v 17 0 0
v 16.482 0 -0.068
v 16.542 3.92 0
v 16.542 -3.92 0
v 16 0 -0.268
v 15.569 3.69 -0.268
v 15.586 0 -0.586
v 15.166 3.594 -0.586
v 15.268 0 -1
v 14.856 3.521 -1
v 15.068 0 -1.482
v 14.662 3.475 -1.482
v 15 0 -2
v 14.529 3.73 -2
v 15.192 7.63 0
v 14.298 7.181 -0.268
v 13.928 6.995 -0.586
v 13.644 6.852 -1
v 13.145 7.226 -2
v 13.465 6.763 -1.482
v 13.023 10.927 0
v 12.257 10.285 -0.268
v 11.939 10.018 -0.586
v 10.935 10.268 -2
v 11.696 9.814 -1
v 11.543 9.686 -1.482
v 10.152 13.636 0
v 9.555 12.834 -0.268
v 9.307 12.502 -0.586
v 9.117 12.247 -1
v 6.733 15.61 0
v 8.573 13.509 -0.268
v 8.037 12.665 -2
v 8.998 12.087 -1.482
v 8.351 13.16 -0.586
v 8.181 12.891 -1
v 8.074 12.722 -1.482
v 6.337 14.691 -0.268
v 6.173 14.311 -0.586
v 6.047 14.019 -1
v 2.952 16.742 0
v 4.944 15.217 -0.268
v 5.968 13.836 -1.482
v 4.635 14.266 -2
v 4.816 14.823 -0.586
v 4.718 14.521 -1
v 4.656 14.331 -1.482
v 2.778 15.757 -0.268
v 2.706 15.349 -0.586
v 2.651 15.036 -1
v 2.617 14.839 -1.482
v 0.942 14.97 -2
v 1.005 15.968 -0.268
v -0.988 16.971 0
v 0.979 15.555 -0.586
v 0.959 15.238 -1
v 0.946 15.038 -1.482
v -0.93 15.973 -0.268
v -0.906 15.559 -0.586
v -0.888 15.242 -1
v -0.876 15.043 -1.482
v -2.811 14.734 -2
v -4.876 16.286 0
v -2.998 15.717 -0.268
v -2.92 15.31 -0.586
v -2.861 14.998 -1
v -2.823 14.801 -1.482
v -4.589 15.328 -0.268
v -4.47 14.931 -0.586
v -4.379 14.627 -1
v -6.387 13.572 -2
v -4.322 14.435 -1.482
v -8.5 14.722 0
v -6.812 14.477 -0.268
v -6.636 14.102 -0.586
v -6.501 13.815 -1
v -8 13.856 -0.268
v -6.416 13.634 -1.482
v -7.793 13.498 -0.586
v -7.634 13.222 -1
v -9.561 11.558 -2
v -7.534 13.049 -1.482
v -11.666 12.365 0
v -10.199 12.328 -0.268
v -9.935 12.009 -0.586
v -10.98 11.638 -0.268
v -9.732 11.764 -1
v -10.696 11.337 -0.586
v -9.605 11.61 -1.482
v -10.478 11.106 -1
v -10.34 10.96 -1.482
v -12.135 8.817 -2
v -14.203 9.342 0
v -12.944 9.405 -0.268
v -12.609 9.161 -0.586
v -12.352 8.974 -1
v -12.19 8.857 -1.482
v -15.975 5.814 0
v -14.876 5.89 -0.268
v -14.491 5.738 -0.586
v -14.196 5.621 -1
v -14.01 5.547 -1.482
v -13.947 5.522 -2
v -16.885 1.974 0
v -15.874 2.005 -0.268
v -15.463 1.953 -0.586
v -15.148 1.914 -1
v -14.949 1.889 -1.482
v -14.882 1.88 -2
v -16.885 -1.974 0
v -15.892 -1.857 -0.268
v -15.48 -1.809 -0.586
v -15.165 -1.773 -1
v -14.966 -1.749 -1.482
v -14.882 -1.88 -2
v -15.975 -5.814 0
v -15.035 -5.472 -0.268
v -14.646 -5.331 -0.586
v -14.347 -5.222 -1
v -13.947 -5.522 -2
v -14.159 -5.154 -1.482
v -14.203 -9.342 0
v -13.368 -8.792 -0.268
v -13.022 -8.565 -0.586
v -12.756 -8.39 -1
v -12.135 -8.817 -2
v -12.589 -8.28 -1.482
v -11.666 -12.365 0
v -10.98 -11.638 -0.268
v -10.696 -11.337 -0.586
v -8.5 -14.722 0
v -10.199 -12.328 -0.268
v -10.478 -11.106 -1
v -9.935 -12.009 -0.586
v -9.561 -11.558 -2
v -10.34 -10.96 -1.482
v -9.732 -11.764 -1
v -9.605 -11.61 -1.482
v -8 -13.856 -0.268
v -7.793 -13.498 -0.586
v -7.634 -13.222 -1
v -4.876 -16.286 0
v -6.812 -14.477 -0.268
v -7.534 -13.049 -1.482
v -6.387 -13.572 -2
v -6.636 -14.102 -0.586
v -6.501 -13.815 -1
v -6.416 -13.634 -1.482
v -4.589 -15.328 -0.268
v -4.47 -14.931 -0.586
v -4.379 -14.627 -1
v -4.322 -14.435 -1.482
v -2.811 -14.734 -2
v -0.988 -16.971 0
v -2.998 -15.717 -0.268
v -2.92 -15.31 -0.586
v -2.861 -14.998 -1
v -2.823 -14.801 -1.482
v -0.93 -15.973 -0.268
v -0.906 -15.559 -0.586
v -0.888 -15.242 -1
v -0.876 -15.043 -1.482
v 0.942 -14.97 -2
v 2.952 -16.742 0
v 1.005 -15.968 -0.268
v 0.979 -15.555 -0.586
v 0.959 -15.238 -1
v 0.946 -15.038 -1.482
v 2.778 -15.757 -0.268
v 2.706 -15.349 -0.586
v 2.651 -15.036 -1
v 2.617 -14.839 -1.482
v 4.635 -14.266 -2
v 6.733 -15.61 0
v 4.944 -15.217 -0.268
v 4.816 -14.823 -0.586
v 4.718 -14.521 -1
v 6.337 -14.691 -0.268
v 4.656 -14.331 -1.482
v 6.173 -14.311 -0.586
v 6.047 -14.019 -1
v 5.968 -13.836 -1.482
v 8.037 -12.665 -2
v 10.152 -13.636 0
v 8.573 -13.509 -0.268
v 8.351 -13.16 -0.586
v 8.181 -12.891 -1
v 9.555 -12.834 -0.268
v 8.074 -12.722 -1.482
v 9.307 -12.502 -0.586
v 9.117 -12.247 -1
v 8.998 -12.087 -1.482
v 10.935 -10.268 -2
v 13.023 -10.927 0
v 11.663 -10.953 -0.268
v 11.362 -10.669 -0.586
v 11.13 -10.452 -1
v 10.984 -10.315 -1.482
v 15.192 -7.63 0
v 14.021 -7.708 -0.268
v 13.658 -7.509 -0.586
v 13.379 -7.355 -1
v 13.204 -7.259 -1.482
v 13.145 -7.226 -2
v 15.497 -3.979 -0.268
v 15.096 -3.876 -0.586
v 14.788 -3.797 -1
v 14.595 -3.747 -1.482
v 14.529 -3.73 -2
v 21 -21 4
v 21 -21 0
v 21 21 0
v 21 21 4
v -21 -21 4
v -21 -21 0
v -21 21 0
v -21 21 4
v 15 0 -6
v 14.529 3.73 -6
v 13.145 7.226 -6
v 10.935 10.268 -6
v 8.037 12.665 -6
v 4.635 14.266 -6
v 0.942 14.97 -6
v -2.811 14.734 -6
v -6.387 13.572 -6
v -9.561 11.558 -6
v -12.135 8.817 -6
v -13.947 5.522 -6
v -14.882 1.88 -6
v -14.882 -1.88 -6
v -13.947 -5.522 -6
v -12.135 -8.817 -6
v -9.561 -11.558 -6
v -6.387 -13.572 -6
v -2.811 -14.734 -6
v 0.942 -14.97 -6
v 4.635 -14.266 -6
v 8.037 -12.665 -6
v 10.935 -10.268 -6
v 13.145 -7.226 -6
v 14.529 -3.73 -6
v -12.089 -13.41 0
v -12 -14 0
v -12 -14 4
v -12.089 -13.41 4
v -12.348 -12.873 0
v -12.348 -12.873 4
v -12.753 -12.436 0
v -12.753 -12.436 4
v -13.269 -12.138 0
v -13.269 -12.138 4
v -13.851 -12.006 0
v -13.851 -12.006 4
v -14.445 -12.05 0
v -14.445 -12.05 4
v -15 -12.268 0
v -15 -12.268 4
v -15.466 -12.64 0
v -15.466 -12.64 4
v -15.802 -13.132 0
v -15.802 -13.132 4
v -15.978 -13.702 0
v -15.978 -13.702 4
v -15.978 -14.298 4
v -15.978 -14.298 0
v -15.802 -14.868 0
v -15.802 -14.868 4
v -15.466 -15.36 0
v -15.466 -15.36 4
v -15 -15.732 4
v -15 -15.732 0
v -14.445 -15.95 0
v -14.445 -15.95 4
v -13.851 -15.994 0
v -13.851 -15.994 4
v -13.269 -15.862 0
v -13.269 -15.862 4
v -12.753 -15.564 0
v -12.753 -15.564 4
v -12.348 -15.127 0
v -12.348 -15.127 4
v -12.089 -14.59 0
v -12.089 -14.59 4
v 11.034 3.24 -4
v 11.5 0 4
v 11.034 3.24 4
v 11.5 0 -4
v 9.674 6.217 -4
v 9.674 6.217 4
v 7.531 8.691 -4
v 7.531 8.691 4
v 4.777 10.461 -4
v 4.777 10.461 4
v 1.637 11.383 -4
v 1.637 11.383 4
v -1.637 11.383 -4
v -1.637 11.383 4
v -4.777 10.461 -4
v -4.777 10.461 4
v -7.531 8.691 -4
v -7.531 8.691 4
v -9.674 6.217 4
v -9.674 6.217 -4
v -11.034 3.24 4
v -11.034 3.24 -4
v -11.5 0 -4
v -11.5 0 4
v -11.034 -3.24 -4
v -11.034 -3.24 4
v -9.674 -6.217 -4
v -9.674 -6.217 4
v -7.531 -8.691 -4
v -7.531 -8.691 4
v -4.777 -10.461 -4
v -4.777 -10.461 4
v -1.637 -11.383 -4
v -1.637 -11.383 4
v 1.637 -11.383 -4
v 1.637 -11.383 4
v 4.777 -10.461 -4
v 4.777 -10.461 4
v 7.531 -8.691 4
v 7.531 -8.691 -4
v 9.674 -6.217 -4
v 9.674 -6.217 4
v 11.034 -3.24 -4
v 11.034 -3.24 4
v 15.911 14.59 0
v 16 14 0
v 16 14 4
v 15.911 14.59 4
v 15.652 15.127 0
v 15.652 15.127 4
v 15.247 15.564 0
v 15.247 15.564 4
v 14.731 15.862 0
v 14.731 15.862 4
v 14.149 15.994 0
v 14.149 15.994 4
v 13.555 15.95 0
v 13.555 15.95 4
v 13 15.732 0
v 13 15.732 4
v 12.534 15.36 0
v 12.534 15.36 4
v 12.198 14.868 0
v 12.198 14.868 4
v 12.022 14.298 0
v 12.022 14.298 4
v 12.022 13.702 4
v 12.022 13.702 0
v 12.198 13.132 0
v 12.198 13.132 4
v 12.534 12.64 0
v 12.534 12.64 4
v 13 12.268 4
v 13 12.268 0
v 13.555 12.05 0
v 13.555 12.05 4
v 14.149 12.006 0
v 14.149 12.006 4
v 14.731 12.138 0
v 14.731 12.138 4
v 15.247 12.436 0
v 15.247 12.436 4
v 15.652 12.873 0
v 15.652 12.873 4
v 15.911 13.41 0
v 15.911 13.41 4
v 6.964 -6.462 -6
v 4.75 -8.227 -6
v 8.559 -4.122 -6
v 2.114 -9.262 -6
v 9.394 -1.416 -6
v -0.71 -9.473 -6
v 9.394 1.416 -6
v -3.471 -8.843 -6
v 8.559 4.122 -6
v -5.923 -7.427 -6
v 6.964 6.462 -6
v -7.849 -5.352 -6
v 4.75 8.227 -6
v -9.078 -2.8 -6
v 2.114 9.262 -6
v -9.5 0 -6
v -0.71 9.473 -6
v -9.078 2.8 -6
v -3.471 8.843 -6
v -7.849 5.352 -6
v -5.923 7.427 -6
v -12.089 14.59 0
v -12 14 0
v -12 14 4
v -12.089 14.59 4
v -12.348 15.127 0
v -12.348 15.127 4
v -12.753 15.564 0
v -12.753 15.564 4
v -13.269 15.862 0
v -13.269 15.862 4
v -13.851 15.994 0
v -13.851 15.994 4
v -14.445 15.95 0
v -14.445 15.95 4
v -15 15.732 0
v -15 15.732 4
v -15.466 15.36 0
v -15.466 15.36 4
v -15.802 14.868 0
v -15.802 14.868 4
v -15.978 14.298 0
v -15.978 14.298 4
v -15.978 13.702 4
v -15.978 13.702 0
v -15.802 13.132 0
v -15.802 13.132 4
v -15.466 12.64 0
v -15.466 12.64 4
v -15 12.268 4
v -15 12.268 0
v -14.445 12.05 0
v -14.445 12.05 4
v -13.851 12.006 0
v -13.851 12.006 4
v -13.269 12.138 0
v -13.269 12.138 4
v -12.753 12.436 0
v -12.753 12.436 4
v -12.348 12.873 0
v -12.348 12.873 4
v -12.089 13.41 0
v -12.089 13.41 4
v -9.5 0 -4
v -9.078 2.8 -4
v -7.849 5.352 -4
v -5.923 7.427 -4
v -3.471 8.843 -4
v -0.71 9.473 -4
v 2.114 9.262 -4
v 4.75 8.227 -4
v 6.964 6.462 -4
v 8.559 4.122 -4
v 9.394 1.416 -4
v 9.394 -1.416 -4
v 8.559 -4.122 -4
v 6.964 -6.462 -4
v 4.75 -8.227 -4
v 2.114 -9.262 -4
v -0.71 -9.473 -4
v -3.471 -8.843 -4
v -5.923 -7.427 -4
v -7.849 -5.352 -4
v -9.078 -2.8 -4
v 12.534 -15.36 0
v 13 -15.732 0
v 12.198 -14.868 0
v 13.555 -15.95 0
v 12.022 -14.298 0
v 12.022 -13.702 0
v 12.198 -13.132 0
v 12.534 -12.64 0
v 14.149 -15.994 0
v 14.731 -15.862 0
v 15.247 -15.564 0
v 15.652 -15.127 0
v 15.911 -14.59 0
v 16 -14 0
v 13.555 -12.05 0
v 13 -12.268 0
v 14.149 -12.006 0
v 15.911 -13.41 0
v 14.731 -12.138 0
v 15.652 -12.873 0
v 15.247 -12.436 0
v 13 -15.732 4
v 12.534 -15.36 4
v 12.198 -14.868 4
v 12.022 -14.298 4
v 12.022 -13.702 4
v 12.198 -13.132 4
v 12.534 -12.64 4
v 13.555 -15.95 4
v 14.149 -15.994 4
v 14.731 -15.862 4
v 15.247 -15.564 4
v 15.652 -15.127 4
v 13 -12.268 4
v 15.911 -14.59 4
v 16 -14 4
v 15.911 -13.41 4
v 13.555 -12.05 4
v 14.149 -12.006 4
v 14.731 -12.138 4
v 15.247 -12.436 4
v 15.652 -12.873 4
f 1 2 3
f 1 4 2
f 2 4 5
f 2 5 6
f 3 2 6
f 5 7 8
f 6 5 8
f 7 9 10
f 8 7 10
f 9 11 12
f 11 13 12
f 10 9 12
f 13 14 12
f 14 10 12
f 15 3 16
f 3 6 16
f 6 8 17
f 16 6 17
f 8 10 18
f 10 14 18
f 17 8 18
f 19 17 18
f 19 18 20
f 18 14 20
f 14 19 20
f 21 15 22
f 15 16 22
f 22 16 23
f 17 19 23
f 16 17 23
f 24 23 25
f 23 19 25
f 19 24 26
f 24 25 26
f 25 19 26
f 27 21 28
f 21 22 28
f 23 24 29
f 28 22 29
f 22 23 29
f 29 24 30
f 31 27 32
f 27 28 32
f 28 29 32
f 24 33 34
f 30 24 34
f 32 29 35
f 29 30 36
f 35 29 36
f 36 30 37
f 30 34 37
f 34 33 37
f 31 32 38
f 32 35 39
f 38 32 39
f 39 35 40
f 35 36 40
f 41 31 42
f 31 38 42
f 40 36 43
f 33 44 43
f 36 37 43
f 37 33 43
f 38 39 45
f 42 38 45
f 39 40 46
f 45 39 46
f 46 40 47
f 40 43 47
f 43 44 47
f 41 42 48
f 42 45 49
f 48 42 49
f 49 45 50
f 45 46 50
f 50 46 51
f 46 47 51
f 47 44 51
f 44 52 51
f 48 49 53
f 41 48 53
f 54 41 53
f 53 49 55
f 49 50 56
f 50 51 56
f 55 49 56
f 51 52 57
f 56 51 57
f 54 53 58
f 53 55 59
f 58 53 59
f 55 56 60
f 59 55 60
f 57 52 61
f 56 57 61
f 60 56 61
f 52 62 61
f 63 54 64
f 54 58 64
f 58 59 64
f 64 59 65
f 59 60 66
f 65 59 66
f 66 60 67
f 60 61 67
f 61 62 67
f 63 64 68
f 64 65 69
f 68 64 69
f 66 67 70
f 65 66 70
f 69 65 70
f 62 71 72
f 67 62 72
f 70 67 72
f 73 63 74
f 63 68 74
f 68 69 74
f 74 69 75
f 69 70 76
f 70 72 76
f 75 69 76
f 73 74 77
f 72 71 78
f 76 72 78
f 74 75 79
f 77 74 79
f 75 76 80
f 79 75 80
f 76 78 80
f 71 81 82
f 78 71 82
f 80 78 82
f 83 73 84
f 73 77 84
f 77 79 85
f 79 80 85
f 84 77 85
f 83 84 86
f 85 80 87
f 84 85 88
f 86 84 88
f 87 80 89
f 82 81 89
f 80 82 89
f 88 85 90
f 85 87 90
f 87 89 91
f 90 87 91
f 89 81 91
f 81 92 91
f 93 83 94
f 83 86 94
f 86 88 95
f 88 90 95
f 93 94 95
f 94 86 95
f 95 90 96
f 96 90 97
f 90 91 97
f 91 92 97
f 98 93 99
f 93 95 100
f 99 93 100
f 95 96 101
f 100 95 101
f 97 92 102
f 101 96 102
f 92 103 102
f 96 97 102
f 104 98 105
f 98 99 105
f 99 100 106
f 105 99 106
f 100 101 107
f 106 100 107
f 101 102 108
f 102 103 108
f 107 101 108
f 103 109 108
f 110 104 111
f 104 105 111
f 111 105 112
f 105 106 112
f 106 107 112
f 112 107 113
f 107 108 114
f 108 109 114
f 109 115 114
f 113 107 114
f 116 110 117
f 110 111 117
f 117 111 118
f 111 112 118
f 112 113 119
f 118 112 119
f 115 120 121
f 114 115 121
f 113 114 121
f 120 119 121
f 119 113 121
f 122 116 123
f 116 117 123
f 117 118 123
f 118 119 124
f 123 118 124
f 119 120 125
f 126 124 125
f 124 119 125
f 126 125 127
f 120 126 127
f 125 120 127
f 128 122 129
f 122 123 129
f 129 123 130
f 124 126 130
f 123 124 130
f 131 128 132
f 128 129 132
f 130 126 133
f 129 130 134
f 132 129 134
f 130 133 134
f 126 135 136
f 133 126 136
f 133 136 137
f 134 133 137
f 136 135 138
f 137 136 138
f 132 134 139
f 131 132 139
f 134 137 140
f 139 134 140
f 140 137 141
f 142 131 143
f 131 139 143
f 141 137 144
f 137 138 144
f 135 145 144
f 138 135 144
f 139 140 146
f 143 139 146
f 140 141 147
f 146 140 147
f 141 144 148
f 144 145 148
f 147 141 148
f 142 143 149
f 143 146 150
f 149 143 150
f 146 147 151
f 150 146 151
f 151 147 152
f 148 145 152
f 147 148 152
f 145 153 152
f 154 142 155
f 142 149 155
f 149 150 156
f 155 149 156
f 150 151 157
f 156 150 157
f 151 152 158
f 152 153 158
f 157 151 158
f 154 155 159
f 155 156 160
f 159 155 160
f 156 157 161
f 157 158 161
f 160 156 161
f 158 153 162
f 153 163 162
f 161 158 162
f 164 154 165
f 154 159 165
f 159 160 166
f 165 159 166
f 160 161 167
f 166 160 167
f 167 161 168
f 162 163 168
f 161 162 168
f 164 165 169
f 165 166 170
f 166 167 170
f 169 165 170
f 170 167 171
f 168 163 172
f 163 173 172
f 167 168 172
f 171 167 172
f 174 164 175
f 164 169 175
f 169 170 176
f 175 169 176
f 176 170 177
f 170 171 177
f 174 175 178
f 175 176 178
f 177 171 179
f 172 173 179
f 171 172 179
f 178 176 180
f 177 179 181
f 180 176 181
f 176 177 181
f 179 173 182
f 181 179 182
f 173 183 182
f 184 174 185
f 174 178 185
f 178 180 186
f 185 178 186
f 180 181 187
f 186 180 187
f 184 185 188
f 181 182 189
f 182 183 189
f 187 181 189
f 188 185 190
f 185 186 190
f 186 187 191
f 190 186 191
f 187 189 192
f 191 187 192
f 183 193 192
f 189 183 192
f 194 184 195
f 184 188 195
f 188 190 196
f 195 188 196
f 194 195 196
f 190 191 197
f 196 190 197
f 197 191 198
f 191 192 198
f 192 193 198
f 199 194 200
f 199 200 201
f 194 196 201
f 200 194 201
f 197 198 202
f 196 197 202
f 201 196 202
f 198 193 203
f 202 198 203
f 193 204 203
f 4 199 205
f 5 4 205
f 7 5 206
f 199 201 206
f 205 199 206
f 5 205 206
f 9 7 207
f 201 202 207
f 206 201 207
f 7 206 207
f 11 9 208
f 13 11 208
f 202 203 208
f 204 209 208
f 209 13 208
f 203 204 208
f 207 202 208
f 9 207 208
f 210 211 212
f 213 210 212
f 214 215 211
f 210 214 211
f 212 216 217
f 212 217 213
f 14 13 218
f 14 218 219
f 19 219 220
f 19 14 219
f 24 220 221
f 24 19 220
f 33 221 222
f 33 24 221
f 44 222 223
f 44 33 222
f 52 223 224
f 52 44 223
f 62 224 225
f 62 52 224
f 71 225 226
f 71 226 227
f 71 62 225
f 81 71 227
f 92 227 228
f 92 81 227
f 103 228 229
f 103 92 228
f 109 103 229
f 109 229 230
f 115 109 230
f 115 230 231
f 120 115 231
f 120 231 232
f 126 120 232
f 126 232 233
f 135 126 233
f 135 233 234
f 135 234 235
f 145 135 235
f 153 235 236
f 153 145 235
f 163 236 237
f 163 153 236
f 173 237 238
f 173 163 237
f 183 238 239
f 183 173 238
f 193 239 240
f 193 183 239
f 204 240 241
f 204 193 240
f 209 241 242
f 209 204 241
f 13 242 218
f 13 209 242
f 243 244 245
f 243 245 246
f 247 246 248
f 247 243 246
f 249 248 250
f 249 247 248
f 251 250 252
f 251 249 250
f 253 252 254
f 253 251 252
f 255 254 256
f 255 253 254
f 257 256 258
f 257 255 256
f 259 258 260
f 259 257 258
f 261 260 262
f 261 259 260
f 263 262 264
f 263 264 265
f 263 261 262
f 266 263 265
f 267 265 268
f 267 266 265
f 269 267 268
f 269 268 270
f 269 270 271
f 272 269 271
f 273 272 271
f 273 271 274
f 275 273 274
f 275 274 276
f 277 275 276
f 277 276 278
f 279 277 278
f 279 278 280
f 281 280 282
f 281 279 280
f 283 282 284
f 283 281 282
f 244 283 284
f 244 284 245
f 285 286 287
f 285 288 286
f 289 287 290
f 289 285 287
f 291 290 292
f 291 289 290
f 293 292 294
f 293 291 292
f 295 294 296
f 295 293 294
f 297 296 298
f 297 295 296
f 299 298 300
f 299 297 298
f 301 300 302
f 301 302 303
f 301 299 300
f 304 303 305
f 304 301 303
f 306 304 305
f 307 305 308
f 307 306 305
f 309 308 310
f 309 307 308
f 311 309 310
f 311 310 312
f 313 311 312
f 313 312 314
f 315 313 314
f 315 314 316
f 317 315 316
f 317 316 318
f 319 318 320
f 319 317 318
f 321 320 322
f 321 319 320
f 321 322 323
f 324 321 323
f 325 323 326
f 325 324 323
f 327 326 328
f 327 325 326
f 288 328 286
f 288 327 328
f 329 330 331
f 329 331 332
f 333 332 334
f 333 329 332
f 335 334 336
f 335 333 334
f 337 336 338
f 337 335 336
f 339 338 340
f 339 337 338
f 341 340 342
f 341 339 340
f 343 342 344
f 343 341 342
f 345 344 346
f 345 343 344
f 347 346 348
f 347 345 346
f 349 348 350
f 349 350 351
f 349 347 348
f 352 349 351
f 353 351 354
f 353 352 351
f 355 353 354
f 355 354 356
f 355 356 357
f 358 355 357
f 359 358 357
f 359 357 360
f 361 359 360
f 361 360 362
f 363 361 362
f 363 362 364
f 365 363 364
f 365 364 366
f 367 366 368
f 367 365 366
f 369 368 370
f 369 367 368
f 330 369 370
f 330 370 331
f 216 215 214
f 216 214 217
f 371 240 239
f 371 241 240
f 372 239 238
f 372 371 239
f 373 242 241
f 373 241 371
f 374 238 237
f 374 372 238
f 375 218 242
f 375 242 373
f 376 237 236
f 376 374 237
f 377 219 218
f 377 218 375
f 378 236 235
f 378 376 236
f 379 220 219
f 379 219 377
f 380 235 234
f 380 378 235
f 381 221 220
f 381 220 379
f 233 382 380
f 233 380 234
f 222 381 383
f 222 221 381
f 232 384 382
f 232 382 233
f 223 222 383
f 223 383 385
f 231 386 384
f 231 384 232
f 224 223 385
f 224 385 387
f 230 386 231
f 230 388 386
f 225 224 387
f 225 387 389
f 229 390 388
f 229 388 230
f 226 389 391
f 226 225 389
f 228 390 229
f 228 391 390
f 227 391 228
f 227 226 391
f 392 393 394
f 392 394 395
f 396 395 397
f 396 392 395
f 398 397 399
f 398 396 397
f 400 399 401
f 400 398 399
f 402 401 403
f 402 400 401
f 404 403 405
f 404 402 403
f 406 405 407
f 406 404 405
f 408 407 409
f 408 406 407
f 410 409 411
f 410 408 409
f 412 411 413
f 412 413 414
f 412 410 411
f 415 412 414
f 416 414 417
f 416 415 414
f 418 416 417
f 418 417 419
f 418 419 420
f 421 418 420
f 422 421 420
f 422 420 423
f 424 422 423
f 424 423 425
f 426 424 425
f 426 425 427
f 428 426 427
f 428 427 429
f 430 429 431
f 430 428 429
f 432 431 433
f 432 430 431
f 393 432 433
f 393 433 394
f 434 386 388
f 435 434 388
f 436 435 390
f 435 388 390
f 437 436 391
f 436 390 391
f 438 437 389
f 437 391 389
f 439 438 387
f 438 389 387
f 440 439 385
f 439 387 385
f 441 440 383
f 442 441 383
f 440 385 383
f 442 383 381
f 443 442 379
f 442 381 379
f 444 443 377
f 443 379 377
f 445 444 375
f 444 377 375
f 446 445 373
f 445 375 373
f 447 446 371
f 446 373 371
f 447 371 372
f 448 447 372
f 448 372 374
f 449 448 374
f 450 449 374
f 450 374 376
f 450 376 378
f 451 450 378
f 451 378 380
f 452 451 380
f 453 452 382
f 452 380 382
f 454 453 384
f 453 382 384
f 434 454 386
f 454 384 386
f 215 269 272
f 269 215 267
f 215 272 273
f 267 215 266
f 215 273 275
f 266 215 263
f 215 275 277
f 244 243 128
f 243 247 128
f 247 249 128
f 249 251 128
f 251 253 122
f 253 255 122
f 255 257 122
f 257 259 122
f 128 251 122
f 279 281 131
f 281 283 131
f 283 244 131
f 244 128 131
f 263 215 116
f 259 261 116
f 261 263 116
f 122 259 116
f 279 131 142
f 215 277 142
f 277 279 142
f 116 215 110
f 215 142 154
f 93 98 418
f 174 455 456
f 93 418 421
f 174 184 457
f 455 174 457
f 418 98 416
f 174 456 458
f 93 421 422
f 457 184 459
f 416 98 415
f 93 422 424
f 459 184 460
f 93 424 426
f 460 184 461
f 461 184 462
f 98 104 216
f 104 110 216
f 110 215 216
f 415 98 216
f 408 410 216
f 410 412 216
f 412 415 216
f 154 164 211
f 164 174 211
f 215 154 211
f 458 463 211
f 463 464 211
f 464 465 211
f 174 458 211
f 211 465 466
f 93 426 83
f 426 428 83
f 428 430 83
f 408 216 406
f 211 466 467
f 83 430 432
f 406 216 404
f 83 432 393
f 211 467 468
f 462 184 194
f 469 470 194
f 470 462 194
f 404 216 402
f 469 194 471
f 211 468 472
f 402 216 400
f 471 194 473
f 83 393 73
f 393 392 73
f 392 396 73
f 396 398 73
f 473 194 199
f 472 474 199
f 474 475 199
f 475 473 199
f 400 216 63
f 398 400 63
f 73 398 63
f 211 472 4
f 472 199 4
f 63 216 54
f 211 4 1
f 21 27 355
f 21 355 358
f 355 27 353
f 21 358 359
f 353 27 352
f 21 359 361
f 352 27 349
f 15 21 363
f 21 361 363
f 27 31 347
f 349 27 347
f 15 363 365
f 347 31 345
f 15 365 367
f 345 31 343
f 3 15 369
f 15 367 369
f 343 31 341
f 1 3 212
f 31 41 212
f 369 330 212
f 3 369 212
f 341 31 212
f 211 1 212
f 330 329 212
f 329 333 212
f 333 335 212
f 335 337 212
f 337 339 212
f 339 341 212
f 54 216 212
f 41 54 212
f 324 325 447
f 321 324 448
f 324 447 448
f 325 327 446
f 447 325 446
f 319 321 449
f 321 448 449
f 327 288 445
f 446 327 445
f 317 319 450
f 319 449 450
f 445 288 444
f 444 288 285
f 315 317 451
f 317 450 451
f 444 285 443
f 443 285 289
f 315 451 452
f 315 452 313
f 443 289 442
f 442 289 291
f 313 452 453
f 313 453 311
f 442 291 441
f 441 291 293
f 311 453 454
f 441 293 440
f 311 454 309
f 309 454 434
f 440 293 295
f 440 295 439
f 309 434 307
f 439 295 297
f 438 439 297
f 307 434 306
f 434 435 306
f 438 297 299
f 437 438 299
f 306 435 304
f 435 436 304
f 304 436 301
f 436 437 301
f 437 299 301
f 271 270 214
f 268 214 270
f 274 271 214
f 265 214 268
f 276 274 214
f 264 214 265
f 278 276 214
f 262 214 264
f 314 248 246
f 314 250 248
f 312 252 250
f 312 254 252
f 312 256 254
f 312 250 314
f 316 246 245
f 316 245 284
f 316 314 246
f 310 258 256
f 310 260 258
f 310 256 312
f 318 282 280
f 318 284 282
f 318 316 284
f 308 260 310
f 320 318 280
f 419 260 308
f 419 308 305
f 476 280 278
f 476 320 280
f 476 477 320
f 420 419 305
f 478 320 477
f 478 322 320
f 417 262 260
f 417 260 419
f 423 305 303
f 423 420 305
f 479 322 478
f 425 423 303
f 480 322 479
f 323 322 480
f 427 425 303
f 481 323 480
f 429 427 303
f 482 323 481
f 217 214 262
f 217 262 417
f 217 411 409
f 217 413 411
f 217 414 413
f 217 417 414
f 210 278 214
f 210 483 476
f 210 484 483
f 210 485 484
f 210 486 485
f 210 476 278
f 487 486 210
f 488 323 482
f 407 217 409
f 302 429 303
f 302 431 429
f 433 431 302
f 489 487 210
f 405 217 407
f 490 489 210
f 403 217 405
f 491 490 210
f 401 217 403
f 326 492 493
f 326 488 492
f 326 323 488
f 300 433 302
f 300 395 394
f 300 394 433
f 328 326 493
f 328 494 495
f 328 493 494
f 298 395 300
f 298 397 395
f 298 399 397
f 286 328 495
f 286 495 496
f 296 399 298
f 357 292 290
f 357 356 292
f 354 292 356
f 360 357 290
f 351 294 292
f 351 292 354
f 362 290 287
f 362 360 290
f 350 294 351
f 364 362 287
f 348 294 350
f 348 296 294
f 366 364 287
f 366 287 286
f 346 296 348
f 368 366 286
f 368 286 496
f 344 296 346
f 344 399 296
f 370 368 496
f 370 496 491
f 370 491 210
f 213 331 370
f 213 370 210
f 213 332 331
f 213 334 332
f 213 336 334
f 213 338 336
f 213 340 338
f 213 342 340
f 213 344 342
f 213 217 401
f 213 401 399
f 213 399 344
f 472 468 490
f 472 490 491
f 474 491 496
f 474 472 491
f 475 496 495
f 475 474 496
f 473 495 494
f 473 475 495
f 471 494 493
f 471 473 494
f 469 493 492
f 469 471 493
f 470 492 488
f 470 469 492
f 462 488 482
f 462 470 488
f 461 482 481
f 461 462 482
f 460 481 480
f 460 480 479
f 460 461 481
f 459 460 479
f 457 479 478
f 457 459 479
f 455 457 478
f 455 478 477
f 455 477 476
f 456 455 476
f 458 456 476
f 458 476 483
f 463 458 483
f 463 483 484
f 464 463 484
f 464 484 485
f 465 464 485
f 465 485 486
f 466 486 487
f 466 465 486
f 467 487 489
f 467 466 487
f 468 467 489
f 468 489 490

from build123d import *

# Parameters (mm, degrees)
SKETCH1_W           = 42
SKETCH1_H           = 42
SKETCH1_R           = 2
SKETCH1_R_2         = 11.5
BOSS_EXTRUDE1_DEPTH = 4
SKETCH2_R           = 15
SKETCH2_R_2         = 11.5
BOSS_EXTRUDE2_DEPTH = 6
SKETCH3_R           = 11.5
SKETCH3_R_2         = 9.5
BOSS_EXTRUDE3_DEPTH = 2
FILLET1_R           = 2


with BuildPart() as part:
    # Sketch1 → Boss-Extrude1 (new body)
    with BuildSketch(Plane.XY):
        Rectangle(SKETCH1_W, SKETCH1_H)
        with Locations((-14, -14)):
            Circle(SKETCH1_R, mode=Mode.SUBTRACT)
        with Locations((14, 14)):
            Circle(SKETCH1_R, mode=Mode.SUBTRACT)
        with Locations((14, -14)):
            Circle(SKETCH1_R, mode=Mode.SUBTRACT)
        with Locations((-14, 14)):
            Circle(SKETCH1_R, mode=Mode.SUBTRACT)
        Circle(SKETCH1_R_2, mode=Mode.SUBTRACT)
    extrude(amount=BOSS_EXTRUDE1_DEPTH)

    # Sketch2 → Boss-Extrude2 (add)
    with BuildSketch(Plane.XY):
        Circle(SKETCH2_R)
        Circle(SKETCH2_R_2, mode=Mode.SUBTRACT)
    extrude(amount=-BOSS_EXTRUDE2_DEPTH)

    # Sketch3 → Boss-Extrude3 (add)
    with BuildSketch(Plane(origin=(0, 0, -6), x_dir=(-1, 0, 0), z_dir=(0, 0, -1))):
        Circle(SKETCH3_R)
        Circle(SKETCH3_R_2, mode=Mode.SUBTRACT)
    extrude(amount=-BOSS_EXTRUDE3_DEPTH)

    # Fillet1
    fillet1_edges = [part.edges().sort_by_distance(p)[0] for p in [
        (-15, 0, 0),
    ]]
    fillet(fillet1_edges, radius=FILLET1_R)


solid = part.part
